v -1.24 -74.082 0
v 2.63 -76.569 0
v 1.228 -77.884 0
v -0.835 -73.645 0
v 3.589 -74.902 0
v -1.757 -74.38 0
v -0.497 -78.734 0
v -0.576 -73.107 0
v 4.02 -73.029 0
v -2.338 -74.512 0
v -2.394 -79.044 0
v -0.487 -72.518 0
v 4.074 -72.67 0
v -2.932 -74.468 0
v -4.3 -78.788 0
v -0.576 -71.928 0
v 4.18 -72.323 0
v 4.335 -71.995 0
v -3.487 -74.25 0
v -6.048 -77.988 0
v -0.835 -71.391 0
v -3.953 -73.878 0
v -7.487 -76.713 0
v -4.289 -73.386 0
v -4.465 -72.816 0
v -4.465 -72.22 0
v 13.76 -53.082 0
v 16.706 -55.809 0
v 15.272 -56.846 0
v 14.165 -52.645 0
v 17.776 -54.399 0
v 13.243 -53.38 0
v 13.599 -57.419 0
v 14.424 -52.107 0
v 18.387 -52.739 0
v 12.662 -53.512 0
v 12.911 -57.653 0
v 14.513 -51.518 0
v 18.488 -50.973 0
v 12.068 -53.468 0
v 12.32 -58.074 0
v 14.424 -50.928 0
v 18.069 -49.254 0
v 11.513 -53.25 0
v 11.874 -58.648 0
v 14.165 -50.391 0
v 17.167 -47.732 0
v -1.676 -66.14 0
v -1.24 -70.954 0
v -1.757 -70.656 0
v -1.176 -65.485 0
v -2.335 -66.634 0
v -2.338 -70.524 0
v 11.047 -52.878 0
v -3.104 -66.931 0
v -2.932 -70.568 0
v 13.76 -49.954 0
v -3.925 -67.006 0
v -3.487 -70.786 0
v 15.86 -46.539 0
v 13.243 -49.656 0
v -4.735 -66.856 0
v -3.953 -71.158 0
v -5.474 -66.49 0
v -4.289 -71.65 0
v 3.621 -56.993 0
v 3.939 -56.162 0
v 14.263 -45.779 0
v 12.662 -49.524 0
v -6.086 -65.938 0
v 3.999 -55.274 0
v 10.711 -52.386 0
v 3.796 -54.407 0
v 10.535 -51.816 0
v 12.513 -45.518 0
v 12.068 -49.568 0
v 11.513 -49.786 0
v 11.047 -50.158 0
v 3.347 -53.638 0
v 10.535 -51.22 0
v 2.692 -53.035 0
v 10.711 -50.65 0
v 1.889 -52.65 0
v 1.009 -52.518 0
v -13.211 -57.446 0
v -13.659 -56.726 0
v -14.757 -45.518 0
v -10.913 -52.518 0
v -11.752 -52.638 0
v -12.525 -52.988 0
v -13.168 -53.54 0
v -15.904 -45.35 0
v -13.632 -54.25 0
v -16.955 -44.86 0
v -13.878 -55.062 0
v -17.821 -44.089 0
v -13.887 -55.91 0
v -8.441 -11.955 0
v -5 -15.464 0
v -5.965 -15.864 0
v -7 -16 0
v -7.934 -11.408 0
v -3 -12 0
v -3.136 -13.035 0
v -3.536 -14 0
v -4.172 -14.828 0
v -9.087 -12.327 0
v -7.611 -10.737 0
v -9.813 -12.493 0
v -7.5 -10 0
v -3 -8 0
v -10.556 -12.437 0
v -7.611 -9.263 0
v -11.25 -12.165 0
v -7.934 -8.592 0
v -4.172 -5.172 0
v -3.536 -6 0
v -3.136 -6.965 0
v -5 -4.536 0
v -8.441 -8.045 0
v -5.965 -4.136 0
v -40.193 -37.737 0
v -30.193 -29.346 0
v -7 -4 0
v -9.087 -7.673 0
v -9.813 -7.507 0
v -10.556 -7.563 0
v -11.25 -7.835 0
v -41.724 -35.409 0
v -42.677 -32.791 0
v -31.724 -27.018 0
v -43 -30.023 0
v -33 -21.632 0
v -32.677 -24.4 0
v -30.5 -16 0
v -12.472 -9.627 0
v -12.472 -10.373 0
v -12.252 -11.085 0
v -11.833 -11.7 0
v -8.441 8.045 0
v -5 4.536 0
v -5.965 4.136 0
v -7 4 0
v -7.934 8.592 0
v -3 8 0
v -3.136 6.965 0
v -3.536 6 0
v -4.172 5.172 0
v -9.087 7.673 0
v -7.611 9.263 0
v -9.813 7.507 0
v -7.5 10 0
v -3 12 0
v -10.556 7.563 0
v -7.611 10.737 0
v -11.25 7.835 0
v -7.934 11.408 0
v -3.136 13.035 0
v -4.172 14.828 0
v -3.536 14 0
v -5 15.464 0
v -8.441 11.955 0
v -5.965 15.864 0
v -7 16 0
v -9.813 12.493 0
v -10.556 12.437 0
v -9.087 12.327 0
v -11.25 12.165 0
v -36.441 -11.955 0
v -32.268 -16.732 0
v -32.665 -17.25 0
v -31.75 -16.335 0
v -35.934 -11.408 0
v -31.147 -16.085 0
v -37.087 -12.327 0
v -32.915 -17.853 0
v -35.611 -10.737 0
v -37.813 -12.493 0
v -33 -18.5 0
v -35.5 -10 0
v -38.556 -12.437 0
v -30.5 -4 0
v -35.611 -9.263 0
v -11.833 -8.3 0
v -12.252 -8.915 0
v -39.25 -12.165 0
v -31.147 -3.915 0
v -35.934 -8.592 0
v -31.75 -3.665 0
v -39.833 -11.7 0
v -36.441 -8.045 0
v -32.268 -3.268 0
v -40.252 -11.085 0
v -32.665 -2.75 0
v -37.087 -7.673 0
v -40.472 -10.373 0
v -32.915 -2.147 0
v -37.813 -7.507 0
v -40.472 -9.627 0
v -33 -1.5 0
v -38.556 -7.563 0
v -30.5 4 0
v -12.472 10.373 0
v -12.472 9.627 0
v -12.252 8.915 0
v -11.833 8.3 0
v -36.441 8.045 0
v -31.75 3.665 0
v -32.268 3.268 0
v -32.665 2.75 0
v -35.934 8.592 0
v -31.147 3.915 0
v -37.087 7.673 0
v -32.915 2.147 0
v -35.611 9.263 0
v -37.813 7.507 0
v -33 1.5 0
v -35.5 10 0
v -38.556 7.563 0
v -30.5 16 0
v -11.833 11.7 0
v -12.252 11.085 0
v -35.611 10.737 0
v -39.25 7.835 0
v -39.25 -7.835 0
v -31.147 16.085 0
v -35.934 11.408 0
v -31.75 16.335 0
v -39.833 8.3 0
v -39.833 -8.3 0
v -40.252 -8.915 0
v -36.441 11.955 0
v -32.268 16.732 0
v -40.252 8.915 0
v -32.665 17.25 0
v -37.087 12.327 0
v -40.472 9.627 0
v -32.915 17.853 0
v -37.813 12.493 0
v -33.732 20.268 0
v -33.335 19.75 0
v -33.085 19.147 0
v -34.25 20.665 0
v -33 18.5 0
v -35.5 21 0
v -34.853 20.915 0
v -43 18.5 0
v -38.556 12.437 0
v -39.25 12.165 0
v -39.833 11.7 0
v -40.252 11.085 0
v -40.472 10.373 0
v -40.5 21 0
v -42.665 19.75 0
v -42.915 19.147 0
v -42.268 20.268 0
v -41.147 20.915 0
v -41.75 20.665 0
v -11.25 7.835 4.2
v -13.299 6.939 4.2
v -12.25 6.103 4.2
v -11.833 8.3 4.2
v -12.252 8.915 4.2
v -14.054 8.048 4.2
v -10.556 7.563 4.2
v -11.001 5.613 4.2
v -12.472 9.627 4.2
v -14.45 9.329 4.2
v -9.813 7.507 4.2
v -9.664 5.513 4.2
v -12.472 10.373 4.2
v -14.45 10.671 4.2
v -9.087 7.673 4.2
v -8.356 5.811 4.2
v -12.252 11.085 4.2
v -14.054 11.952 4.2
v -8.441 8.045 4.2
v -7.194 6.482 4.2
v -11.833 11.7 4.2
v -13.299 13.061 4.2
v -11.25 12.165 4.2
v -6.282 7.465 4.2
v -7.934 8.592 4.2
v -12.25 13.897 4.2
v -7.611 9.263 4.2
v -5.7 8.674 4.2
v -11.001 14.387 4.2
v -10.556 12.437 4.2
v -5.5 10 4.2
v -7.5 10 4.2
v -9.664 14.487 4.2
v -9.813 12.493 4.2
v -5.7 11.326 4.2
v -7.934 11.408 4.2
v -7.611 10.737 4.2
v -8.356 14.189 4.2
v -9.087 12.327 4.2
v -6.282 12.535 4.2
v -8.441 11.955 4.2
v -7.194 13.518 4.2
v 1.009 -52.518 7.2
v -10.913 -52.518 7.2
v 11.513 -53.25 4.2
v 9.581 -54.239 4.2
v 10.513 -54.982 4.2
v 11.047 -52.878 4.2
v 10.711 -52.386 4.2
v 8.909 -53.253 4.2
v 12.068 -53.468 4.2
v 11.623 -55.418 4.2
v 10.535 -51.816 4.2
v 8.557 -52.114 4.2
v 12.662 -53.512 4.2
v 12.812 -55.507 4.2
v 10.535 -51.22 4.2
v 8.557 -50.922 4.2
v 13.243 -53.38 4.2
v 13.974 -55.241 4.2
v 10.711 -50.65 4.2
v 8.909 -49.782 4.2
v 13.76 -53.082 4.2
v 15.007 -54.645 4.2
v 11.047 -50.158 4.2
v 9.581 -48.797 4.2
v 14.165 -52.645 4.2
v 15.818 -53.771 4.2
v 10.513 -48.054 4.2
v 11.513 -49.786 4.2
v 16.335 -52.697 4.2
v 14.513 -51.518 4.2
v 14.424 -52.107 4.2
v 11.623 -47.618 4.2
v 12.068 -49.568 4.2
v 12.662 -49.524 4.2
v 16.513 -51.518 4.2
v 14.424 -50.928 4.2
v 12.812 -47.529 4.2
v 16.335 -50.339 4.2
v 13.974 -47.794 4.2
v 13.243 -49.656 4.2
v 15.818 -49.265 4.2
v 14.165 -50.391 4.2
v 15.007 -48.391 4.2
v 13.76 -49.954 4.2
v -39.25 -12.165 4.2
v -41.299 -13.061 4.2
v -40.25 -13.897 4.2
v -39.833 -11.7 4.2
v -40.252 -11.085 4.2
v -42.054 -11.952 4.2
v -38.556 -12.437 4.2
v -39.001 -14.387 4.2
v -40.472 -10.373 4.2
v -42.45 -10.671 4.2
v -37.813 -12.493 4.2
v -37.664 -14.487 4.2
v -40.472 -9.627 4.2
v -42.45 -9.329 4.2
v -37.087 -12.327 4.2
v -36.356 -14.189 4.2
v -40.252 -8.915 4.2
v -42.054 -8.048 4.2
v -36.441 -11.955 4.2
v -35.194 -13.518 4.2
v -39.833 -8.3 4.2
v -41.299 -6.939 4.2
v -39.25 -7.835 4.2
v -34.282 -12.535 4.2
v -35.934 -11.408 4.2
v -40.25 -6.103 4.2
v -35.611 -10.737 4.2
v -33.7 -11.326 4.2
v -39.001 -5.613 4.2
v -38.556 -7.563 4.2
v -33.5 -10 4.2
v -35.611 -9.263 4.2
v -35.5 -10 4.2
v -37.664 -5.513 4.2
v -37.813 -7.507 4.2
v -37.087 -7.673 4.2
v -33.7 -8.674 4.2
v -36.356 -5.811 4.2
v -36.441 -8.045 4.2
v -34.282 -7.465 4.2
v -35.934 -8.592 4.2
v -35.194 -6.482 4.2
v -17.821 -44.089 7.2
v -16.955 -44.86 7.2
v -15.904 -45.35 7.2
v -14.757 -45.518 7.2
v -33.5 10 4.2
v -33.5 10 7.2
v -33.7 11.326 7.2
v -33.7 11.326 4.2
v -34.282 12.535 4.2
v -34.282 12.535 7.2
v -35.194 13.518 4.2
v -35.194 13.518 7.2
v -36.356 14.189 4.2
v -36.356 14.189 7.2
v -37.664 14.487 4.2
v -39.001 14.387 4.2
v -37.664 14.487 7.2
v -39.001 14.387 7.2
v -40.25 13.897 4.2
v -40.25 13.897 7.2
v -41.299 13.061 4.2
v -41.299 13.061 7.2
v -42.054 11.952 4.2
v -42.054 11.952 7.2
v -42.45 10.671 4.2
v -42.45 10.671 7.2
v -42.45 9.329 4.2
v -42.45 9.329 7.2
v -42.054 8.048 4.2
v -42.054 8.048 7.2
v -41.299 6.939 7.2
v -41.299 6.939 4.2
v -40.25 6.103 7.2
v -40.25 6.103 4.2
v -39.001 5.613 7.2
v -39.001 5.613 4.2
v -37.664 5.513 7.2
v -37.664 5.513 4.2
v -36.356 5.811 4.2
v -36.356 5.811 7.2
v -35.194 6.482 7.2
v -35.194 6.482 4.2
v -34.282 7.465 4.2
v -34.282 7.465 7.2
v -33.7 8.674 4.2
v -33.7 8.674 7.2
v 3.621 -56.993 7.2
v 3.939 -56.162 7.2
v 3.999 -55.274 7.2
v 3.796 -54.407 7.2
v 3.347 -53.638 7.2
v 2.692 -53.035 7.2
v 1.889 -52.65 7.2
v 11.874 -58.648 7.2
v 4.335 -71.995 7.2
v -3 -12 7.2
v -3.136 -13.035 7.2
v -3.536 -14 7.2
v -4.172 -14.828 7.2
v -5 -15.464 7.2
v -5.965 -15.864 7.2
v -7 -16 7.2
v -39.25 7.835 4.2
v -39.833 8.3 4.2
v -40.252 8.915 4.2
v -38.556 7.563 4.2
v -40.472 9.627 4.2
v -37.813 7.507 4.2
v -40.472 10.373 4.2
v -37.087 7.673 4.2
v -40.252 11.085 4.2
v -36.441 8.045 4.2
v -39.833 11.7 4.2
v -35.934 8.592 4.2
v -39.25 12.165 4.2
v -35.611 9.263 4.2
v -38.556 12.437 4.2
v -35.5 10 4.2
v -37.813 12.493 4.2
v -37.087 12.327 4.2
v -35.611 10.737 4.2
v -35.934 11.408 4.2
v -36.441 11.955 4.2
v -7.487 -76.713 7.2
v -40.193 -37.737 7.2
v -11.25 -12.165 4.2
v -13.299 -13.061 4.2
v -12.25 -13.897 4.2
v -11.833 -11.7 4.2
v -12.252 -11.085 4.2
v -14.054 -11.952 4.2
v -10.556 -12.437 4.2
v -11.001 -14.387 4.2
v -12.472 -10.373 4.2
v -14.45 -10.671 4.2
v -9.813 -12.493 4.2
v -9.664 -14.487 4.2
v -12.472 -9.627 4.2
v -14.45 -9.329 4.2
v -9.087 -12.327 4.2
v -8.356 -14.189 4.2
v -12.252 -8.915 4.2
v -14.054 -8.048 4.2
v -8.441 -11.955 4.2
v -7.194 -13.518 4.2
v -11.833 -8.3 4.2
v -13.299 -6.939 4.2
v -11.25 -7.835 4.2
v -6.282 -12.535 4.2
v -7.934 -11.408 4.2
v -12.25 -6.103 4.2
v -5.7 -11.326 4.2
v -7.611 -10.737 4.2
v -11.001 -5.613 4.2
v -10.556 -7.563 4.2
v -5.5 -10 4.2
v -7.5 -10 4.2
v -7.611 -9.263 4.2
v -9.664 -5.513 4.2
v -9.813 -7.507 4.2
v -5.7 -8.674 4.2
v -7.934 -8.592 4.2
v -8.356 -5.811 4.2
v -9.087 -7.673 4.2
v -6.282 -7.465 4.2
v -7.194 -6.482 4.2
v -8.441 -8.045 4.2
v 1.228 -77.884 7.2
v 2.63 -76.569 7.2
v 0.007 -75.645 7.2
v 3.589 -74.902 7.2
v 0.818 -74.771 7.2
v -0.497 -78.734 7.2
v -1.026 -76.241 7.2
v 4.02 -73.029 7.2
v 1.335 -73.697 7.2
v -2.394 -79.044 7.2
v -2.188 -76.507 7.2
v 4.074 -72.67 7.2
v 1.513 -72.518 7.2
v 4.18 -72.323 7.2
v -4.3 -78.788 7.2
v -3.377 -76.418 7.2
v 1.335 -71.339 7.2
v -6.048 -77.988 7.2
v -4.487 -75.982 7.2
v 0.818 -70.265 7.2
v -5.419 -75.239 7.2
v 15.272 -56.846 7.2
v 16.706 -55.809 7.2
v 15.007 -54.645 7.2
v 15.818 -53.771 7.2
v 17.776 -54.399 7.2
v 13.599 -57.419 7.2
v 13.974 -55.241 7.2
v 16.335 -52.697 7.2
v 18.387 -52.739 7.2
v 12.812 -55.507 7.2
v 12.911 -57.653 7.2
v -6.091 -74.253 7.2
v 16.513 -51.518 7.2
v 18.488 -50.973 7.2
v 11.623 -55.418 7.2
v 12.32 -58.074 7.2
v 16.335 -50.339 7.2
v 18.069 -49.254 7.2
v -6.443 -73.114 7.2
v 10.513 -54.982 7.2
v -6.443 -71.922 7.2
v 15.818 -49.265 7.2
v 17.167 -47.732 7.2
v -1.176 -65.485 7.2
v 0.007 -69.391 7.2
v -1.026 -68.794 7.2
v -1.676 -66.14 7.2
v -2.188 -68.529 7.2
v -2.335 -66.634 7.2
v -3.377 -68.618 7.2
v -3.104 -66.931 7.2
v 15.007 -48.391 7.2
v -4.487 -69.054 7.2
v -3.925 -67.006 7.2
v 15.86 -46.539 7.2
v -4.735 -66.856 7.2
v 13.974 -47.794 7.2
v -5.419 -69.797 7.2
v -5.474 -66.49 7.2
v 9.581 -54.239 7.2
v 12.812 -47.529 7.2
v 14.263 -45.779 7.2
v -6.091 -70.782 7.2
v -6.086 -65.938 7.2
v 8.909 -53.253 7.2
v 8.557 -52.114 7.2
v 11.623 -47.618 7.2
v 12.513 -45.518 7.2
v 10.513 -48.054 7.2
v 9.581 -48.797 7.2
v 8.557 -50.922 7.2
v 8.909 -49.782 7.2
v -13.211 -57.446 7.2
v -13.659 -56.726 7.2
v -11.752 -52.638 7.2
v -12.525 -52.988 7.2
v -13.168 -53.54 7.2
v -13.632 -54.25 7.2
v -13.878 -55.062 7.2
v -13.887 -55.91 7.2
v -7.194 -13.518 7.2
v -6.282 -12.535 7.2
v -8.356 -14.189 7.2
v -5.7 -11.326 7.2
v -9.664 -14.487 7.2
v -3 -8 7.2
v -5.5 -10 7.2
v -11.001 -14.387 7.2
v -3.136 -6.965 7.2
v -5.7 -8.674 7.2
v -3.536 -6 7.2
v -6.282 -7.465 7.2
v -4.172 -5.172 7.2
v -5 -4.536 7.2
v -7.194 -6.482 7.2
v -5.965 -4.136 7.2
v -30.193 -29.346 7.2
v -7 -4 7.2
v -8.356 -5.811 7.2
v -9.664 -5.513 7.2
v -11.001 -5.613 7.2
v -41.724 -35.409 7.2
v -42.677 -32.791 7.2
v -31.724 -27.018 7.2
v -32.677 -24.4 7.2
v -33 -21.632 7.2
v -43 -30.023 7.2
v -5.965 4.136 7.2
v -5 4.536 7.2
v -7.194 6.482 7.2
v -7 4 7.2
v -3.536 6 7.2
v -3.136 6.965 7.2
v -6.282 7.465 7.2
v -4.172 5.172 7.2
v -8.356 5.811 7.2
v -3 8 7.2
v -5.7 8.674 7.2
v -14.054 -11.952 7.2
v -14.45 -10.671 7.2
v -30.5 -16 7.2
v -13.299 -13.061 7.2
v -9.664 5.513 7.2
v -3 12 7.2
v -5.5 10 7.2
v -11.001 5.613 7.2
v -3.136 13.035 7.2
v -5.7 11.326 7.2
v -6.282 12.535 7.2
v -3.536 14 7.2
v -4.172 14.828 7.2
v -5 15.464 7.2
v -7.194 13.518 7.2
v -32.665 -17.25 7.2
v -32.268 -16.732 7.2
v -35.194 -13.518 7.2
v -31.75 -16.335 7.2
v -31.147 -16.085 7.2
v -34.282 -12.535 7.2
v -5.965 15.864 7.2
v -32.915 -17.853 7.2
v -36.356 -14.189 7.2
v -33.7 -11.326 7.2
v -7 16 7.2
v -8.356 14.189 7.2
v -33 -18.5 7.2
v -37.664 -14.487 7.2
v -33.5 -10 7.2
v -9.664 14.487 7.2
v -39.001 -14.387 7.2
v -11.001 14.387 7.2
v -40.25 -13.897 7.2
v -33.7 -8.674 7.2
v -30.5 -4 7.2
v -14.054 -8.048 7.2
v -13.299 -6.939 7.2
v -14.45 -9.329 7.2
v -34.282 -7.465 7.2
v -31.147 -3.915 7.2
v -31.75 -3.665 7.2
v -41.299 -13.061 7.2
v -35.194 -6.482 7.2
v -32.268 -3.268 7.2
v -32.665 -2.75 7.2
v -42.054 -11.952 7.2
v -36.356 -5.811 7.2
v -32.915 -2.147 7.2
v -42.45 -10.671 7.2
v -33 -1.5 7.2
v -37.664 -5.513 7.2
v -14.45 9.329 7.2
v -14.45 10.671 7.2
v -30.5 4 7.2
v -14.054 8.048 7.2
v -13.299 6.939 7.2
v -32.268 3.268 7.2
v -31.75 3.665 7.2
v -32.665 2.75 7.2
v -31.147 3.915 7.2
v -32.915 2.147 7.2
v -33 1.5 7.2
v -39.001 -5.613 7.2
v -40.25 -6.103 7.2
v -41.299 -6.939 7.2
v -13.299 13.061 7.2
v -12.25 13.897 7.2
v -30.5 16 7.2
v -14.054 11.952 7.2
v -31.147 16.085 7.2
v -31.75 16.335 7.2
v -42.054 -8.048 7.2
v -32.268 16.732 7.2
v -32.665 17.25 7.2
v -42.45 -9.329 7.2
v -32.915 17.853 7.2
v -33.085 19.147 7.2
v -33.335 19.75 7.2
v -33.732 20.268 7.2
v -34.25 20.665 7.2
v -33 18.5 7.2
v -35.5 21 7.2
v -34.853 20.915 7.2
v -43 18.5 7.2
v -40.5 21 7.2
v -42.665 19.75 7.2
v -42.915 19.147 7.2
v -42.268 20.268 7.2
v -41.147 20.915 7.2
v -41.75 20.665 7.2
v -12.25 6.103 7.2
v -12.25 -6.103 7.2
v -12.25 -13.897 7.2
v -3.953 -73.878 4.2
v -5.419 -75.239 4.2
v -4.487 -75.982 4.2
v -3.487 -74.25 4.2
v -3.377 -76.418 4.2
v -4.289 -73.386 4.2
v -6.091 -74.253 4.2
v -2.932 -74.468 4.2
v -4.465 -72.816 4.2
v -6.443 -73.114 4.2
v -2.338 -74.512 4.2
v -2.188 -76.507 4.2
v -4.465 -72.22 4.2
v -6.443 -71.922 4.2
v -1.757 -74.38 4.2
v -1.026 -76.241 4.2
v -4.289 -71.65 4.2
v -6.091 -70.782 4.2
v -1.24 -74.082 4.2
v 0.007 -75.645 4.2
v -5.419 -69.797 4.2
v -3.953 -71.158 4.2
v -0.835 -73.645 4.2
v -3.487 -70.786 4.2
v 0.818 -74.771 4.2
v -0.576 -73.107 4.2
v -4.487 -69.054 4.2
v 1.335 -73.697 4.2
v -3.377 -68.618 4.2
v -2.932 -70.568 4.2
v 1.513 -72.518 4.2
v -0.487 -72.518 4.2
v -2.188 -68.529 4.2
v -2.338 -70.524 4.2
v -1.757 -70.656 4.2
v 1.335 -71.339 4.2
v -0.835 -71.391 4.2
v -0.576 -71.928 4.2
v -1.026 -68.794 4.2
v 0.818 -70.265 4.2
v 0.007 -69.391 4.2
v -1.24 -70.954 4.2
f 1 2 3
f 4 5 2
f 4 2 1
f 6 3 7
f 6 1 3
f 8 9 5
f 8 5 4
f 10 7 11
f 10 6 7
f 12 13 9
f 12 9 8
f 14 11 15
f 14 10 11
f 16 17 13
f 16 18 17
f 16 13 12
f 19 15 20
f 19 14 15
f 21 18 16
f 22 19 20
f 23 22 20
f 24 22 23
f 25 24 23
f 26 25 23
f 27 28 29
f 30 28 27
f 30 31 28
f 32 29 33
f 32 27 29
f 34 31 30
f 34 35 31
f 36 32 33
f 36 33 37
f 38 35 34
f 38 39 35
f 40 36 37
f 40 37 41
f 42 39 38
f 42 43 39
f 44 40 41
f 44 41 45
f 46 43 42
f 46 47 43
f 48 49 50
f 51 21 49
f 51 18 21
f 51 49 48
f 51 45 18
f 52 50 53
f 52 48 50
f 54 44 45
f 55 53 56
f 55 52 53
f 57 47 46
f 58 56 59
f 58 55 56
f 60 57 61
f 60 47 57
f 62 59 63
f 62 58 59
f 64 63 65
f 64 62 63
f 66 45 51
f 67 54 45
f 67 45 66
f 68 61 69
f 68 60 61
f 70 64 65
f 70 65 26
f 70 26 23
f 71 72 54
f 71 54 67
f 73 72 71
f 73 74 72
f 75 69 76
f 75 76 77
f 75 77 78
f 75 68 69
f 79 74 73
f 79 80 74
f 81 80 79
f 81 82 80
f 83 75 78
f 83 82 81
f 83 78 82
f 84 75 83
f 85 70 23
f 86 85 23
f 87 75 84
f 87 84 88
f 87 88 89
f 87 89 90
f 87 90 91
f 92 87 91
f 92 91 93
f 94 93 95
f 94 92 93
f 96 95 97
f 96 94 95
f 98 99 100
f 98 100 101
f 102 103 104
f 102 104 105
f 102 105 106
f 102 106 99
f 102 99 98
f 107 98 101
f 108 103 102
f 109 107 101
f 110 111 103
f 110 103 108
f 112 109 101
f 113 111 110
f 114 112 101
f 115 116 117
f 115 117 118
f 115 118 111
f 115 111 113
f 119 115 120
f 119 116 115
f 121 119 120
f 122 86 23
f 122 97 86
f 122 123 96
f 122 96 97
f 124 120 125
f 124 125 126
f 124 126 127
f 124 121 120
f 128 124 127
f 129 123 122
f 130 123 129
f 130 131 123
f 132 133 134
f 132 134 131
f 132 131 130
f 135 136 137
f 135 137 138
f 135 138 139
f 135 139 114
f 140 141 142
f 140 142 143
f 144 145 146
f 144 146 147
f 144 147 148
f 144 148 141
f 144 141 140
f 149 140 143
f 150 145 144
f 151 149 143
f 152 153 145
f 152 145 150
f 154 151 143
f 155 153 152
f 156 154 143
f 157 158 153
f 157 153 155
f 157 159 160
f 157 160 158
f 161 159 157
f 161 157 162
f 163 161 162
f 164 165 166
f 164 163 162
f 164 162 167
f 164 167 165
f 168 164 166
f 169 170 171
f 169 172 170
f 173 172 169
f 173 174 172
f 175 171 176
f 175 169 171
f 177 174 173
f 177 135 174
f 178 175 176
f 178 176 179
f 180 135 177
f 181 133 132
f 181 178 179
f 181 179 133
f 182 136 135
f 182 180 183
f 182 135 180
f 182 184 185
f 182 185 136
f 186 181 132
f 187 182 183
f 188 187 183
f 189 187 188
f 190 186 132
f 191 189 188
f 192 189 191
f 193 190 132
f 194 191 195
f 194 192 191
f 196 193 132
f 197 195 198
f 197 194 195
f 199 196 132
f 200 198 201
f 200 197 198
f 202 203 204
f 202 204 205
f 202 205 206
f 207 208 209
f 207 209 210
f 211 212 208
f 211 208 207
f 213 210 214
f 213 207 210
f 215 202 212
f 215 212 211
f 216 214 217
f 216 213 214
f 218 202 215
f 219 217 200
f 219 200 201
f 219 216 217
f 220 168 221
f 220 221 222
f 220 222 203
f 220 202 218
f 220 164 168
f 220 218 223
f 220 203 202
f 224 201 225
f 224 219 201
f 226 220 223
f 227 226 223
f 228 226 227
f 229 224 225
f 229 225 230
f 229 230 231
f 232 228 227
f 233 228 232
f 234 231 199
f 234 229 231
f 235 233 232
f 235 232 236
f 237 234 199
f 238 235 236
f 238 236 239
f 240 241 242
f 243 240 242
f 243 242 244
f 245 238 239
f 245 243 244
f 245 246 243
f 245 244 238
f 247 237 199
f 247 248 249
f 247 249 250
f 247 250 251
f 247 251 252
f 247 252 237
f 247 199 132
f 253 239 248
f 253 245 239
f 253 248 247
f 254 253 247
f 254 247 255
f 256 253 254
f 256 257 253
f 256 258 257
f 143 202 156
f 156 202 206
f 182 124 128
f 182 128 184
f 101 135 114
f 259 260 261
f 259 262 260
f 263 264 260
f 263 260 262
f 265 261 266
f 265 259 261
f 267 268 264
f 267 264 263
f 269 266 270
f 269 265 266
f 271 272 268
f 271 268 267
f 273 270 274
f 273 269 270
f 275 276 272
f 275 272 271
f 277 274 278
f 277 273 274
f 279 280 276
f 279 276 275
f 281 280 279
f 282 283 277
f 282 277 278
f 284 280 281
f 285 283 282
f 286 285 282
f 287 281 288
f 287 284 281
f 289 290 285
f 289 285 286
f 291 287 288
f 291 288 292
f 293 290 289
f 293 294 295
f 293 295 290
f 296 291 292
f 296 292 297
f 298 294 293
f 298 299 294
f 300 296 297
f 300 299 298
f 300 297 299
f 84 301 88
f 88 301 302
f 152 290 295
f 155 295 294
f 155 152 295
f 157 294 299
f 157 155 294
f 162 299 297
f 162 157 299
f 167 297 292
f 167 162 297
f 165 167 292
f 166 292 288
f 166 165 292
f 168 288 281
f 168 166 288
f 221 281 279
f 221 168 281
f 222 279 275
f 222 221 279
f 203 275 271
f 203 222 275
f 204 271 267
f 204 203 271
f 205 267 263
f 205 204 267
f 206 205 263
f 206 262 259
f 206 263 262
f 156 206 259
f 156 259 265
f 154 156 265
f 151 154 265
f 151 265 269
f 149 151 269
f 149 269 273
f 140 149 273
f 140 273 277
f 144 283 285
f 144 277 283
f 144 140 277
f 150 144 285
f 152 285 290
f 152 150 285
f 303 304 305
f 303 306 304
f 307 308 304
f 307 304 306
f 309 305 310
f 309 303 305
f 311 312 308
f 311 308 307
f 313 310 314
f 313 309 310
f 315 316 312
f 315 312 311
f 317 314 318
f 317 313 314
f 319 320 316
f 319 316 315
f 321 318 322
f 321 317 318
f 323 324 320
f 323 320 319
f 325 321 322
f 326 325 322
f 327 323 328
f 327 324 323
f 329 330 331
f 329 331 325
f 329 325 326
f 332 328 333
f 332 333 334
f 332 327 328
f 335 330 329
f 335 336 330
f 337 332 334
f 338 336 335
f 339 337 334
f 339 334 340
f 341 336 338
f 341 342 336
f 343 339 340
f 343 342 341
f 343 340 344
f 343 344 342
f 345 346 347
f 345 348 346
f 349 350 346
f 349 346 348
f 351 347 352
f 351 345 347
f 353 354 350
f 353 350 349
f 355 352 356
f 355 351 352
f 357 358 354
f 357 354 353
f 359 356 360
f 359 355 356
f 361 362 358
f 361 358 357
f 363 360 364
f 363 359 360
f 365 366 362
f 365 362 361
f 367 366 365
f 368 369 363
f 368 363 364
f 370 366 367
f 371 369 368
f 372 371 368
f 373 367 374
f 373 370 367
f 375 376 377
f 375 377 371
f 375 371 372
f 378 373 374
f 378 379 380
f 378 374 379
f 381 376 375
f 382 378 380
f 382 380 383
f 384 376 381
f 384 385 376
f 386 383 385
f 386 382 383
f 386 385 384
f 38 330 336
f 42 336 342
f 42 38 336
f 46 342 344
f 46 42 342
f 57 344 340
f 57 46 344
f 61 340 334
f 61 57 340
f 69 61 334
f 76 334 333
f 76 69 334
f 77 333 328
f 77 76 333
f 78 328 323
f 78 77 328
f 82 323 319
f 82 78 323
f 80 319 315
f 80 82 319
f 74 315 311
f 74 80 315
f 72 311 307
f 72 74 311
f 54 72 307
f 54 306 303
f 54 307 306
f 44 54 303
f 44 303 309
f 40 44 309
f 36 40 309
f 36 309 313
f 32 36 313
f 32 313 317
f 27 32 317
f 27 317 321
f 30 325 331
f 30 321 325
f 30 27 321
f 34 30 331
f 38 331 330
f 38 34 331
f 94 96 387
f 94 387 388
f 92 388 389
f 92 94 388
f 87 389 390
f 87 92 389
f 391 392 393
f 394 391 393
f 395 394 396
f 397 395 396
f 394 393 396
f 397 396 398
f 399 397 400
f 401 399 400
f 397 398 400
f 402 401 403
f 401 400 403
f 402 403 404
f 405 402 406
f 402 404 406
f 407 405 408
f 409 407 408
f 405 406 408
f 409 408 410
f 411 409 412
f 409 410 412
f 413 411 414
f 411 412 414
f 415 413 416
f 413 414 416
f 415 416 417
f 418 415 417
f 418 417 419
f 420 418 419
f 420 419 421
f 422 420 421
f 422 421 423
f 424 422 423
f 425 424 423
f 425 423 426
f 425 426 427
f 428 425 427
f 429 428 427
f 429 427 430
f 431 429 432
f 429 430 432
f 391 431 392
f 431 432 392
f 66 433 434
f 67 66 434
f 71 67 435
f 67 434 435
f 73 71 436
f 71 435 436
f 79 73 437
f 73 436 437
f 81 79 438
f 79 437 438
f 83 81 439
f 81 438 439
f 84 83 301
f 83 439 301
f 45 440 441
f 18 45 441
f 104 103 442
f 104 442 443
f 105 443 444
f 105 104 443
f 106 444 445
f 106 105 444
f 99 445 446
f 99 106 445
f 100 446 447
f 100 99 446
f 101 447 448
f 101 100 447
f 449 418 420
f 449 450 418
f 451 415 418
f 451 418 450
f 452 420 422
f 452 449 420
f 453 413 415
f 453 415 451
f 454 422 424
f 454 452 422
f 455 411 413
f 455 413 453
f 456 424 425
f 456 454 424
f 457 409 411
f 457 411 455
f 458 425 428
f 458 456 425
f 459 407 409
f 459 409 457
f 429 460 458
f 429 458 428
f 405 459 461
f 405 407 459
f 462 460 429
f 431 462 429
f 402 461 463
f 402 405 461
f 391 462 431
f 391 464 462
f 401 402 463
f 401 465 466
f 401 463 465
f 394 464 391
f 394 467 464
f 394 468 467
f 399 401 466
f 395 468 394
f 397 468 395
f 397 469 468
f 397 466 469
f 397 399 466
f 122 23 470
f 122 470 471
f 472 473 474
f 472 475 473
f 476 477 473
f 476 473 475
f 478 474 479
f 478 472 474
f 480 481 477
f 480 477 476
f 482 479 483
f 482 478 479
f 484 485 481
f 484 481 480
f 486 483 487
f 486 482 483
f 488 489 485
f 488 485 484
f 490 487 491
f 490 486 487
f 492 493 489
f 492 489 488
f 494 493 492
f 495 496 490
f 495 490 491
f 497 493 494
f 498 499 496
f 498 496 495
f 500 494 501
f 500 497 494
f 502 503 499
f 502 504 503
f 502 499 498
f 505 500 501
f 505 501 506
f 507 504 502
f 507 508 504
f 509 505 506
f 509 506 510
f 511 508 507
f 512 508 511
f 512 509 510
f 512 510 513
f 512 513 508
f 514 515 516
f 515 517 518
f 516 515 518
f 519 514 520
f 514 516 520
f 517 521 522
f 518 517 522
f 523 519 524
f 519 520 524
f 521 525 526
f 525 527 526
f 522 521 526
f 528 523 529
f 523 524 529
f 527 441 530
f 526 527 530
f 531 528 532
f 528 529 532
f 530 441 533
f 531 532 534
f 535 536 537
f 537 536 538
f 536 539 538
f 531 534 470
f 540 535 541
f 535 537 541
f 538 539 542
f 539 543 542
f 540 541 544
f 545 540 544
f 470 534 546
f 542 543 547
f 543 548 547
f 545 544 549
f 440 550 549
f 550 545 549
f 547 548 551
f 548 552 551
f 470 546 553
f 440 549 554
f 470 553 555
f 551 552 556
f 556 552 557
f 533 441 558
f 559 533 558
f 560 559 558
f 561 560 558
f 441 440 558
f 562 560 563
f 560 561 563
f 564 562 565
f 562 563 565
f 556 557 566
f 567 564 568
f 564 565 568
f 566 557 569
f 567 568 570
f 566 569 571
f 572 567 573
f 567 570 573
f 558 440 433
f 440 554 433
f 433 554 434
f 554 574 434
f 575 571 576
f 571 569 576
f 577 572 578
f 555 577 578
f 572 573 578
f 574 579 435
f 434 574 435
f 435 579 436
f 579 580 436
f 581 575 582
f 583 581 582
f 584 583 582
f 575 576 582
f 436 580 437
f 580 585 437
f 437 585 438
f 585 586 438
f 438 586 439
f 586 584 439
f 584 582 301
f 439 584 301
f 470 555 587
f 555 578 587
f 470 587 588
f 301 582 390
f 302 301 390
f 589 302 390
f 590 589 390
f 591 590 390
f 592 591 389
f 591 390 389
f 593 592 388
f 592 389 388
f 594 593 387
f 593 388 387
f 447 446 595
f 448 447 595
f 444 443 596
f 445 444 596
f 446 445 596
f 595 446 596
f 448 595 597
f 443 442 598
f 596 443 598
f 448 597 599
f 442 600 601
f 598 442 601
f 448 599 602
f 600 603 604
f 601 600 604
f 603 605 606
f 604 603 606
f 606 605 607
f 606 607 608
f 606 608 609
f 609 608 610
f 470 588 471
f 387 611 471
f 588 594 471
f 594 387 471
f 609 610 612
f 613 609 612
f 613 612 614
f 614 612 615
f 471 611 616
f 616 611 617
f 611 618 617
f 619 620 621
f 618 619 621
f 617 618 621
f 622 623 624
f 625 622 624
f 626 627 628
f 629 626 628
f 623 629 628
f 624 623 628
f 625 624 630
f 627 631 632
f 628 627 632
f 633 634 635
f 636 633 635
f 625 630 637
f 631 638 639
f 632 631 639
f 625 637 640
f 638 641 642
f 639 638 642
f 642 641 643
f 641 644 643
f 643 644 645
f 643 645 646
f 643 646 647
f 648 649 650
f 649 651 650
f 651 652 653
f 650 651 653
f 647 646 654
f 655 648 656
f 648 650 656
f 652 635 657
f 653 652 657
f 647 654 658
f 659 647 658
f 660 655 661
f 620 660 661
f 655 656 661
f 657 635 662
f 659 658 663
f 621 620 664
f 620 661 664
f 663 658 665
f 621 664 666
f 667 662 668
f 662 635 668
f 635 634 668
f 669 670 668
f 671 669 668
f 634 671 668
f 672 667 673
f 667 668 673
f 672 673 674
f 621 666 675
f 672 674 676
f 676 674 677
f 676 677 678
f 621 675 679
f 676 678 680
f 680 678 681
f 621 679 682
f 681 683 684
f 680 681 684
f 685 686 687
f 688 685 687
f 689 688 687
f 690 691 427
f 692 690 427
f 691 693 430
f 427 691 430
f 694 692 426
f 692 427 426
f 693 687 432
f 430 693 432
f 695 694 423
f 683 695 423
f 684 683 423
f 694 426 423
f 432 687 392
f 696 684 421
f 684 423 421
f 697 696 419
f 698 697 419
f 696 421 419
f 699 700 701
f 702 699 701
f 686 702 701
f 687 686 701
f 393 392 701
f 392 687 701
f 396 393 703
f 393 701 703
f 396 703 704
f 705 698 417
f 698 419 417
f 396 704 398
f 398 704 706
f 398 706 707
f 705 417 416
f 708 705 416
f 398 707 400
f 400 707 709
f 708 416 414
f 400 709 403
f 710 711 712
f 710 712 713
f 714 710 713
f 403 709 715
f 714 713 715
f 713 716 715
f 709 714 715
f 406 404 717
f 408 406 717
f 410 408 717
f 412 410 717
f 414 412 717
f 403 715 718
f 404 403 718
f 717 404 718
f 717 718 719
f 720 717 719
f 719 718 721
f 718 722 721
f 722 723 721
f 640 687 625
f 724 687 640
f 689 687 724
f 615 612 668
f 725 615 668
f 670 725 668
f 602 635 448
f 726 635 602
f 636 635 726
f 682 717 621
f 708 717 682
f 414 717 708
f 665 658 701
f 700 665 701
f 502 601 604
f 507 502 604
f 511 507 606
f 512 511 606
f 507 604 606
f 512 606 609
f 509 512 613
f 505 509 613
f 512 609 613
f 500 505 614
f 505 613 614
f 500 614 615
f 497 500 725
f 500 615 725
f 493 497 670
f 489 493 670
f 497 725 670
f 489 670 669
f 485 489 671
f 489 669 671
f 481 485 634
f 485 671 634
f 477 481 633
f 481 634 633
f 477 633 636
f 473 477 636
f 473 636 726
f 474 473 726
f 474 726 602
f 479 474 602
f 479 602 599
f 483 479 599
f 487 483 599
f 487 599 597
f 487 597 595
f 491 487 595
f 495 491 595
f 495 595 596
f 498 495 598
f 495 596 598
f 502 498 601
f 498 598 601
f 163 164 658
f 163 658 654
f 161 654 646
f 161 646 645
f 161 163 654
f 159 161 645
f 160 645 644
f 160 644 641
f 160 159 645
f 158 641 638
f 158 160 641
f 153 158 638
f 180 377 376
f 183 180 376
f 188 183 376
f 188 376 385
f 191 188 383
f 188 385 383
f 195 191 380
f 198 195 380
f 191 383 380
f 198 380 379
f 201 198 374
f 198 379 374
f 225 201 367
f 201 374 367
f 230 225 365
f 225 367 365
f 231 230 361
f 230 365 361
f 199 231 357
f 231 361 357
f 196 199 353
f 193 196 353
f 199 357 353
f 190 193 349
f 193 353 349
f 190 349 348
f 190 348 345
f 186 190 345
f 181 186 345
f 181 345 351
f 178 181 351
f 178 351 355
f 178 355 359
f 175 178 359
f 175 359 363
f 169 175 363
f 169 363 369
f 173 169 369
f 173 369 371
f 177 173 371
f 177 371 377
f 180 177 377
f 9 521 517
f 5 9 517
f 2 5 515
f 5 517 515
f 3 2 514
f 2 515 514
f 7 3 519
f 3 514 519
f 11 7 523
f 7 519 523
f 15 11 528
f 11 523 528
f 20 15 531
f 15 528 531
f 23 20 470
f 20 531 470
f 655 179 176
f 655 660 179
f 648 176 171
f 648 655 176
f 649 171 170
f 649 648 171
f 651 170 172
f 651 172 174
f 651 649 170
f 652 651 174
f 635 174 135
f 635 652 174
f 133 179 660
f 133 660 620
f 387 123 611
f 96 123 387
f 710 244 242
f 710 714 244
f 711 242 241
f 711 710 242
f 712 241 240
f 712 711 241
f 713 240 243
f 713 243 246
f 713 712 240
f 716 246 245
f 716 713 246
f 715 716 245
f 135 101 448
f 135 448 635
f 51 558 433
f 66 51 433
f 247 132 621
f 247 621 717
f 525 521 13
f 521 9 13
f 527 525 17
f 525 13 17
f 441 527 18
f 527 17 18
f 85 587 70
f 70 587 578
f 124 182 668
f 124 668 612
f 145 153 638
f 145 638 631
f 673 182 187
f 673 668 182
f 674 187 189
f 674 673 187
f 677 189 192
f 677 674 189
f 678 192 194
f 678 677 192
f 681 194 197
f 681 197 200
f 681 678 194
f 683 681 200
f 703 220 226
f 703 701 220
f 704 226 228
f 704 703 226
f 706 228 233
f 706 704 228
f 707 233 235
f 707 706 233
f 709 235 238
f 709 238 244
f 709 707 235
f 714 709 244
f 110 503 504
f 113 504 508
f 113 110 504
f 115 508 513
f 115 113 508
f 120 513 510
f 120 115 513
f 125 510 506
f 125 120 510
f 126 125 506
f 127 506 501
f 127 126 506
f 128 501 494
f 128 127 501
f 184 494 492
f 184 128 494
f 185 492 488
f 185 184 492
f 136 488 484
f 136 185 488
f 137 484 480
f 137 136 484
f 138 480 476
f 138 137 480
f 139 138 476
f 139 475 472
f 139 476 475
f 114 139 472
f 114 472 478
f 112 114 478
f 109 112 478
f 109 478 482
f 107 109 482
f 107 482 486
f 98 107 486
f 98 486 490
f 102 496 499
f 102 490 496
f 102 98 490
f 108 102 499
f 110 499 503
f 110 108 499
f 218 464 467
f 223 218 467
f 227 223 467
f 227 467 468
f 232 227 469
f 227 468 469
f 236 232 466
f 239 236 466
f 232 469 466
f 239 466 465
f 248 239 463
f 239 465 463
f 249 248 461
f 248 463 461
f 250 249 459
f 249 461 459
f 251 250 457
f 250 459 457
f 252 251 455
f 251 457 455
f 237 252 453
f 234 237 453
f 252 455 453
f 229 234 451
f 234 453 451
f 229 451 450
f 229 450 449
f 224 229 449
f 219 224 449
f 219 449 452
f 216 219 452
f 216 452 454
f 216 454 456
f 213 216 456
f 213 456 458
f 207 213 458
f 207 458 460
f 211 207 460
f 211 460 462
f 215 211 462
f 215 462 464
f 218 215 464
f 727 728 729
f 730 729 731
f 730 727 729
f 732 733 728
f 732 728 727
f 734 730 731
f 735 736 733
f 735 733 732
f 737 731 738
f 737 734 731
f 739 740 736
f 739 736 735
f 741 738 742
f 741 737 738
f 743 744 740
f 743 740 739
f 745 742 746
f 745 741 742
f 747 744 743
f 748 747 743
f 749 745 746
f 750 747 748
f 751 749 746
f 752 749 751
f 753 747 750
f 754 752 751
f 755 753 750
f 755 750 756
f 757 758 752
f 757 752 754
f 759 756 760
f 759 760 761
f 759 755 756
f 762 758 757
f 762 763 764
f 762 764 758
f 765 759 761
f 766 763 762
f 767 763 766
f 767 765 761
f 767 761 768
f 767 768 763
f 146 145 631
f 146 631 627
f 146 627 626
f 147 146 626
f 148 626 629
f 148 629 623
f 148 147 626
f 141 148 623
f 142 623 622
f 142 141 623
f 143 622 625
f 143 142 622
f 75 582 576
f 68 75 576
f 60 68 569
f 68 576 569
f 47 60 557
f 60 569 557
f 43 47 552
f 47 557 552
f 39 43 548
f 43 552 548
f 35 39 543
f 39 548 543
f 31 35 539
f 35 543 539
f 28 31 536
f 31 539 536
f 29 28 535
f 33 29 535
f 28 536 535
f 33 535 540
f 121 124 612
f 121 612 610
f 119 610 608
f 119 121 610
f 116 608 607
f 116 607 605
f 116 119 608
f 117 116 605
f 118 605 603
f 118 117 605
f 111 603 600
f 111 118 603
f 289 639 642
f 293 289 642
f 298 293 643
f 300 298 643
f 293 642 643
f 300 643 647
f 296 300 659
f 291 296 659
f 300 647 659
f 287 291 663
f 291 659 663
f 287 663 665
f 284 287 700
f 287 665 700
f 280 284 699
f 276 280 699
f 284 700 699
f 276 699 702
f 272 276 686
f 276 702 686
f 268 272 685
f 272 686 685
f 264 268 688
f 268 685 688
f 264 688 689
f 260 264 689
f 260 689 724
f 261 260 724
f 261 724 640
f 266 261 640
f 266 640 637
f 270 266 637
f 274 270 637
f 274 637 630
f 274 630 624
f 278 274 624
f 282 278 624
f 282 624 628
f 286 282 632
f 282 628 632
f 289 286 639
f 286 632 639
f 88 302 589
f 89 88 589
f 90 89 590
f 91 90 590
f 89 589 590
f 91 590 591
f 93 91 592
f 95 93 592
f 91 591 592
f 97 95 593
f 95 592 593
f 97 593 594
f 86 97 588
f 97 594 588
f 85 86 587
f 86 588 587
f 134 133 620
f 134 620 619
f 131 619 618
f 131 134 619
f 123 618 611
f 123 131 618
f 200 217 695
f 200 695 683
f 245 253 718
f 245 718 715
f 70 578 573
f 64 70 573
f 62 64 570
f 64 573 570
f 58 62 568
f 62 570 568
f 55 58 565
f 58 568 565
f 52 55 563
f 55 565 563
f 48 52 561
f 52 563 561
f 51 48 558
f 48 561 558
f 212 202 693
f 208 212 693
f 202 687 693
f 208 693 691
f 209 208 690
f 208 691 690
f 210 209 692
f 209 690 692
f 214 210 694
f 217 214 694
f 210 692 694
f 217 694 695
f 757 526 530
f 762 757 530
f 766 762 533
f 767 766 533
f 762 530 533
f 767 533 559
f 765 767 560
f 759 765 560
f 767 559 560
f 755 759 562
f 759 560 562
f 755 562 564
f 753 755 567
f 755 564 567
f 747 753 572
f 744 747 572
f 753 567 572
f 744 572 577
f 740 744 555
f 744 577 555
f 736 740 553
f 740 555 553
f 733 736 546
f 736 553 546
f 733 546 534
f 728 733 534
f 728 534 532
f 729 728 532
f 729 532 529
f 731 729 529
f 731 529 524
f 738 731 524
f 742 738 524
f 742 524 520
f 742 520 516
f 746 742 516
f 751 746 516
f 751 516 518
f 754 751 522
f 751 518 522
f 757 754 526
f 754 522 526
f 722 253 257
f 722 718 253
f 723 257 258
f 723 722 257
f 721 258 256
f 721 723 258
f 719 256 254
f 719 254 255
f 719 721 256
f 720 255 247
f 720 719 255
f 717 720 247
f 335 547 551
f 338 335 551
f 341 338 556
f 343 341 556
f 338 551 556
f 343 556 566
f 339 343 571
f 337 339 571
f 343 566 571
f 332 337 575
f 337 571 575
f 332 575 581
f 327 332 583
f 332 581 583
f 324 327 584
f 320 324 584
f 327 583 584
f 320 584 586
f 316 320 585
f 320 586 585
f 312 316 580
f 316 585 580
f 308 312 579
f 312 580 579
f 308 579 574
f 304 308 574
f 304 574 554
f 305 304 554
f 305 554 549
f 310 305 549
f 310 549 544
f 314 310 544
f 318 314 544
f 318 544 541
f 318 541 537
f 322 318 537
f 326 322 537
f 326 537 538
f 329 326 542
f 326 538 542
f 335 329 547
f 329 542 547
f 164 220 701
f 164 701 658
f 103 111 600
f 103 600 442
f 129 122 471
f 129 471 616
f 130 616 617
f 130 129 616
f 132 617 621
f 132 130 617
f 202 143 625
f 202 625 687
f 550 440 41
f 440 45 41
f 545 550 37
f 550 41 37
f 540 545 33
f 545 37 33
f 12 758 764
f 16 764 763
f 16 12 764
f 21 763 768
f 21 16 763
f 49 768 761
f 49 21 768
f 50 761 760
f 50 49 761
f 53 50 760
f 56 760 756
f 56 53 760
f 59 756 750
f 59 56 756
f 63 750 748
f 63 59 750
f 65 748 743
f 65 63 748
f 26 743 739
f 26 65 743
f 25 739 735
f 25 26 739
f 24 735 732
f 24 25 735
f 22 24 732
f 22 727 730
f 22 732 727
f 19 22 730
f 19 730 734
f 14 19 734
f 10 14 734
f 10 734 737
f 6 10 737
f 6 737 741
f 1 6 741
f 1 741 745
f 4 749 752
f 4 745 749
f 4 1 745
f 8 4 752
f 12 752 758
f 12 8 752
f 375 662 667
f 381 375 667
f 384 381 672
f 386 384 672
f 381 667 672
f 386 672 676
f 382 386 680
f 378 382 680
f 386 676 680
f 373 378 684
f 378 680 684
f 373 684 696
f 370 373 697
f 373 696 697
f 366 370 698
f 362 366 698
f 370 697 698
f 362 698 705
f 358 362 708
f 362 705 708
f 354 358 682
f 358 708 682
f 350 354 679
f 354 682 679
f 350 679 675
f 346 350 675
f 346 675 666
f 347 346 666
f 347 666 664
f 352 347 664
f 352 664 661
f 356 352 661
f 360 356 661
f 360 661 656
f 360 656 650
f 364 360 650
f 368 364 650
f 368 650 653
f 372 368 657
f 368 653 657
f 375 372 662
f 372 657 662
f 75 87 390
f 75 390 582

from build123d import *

# Parameters (mm, degrees)
SKETCH2_R            = 2.5
SKETCH2_R_2          = 2
BOSS_EXTRUDE1_DEPTH  = 7.2
MOVE_FACE1_OUTLINE_R = 2.5
MOVE_FACE1_DEPTH     = 7.2
CUT_EXTRUDE2_DEPTH   = 92.988260121
FILLET1_R            = 2.5
SKETCH5_R            = 2.5
CUT_EXTRUDE3_DEPTH   = 91.271536943
CUT_EXTRUDE4_DEPTH   = 91.271536943
SKETCH8_R            = 4.5
SKETCH8_R_2          = 4
CUT_EXTRUDE5_DEPTH   = 3


# Read off the part's stored shape, not the designer's step: Move Face1
with BuildPart() as part:
    # Sketch2 → Boss-Extrude1 (new body)
    with BuildSketch(Plane.XY):
        with BuildLine():
            Line((3, 4), (-33, 4))
            Line((-33, 4), (-33, -4))
            Line((-33, -4), (3, -4))
            ThreePointArc((3, -4), (5.828427125, -5.171572875), (7, -8))
            Line((7, -8), (7, -12))
            ThreePointArc((7, -12), (5.828427125, -14.828427125), (3, -16))
            Line((3, -16), (-33, -16))
            Line((-33, -16), (-33, -21.632357189))
            ThreePointArc((-33, -21.632357189), (-32.276311449, -25.736598909), (-30.192533317, -29.345808505))
            Line((-30.192533317, -29.345808505), (-17.821439842, -44.089103599))
            ThreePointArc((-17.821439842, -44.089103599), (-16.447735116, -45.143184308), (-14.757262069, -45.51795316))
            Line((-14.757262069, -45.51795316), (14.512756385, -45.51795316))
            ThreePointArc((14.512756385, -45.51795316), (17.34118351, -46.689526036), (18.512756385, -49.51795316))
            Line((18.512756385, -49.51795316), (18.512756385, -81))
            Line((18.512756385, -81), (8.861465874, -81))
            Line((8.861465874, -81), (1.705289702, -81))
            ThreePointArc((1.705289702, -81), (-3.366129439, -79.875693444), (-7.487243615, -76.713451316))
            Line((-7.487243615, -76.713451316), (-40.192533317, -37.736804817))
            ThreePointArc((-40.192533317, -37.736804817), (-42.276311449, -34.12759522), (-43, -30.023353501))
            Line((-43, -30.023353501), (-43, 21))
            Line((-43, 21), (-33, 21))
            Line((-33, 21), (-33, 16))
            Line((-33, 16), (3, 16))
            ThreePointArc((3, 16), (5.828427125, 14.828427125), (7, 12))
            Line((7, 12), (7, 8))
            ThreePointArc((7, 8), (5.828427125, 5.171572875), (3, 4))
        make_face()
        with Locations((0, 10)):
            Circle(SKETCH2_R, mode=Mode.SUBTRACT)
        with Locations(Location((0, -10, 0), (0, 0, 180))):
            Circle(SKETCH2_R, mode=Mode.SUBTRACT)
        with Locations((12.512756385, -51.51795316)):
            Circle(SKETCH2_R_2, mode=Mode.SUBTRACT)
        with Locations((-2.487243615, -72.51795316)):
            Circle(SKETCH2_R_2, mode=Mode.SUBTRACT)
    extrude(amount=BOSS_EXTRUDE1_DEPTH)

    # Move Face1 outline → Move Face1 (cut)
    # profile 1 of 4: a face of its own
    with BuildSketch(Plane.XY):
        with BuildLine():
            Line((-3, -8), (-3, -12))
            ThreePointArc((-3, -12), (-4.171572875, -14.828427125), (-7, -16))
            Line((-7, -16), (3, -16))
            ThreePointArc((3, -16), (5.828427125, -14.828427125), (7, -12))
            Line((7, -12), (7, -8))
            ThreePointArc((7, -8), (5.828427125, -5.171572875), (3, -4))
            Line((3, -4), (-7, -4))
            ThreePointArc((-7, -4), (-4.171572875, -5.171572875), (-3, -8))
        make_face()
        with Locations((0, -10)):
            Circle(MOVE_FACE1_OUTLINE_R, mode=Mode.SUBTRACT)
    # profile 2 of 4: a face of its own
    with BuildSketch(Plane.XY):
        with BuildLine():
            ThreePointArc((-7, 16), (-4.171572875, 14.828427125), (-3, 12))
            Line((-3, 12), (-3, 8))
            ThreePointArc((-3, 8), (-4.171572875, 5.171572875), (-7, 4))
            Line((-7, 4), (3, 4))
            ThreePointArc((3, 4), (5.828427125, 5.171572875), (7, 8))
            Line((7, 8), (7, 12))
            ThreePointArc((7, 12), (5.828427125, 14.828427125), (3, 16))
            Line((3, 16), (-7, 16))
        make_face()
        with Locations((0, 10)):
            Circle(MOVE_FACE1_OUTLINE_R, mode=Mode.SUBTRACT)
    # profile 3 of 4: a face of its own
    with BuildSketch(Plane.XY):
        with Locations((-10, 10)):
            Circle(MOVE_FACE1_OUTLINE_R)
    # profile 4 of 4: a face of its own
    with BuildSketch(Plane.XY):
        with Locations((-10, -10)):
            Circle(MOVE_FACE1_OUTLINE_R)
    extrude(amount=MOVE_FACE1_DEPTH, mode=Mode.SUBTRACT)

    # Sketch4 → Cut-Extrude2 (cut, through all)
    with BuildSketch(Plane.XY.offset(7.2)):
        with BuildLine():
            Line((12.512756385, -57.51795316), (4.039792831, -72.51795316))
            ThreePointArc((4.039792831, -72.51795316), (-0.254865674, -78.651361145), (-7.487243615, -76.713451316))
            Line((-7.487243615, -76.713451316), (-9.608649797, -88.557738574))
            Line((-9.608649797, -88.557738574), (26.411143911, -81.246796091))
            Line((26.411143911, -81.246796091), (26.411143911, -45.51795316))
            Line((26.411143911, -45.51795316), (12.512756385, -45.51795316))
            ThreePointArc((12.512756385, -45.51795316), (18.512756385, -51.51795316), (12.512756385, -57.51795316))
        make_face()
    extrude(amount=-CUT_EXTRUDE2_DEPTH, mode=Mode.SUBTRACT)

    # Fillet1
    fillet1_edges = [part.edges().sort_by_distance(p)[0] for p in [
        (12.512756385, -57.51795316, 3.6),
        (4.039792831, -72.51795316, 3.6),
        (-33, 16, 3.6),
        (-33, 4, 3.6),
        (-33, -4, 3.6),
        (-33, -16, 3.6),
        (-43, 21, 3.6),
        (-33, 21, 3.6),
    ]]
    fillet(fillet1_edges, radius=FILLET1_R - 0.0001)  # a hair under: the kernel refuses the full size

    # Sketch5 → Cut-Extrude3 (cut, through all)
    with BuildSketch(Plane.XY.offset(7.2)):
        with Locations((-38, 10)):
            Circle(SKETCH5_R)
        with Locations((-38, -10)):
            Circle(SKETCH5_R)
    extrude(amount=-CUT_EXTRUDE3_DEPTH, mode=Mode.SUBTRACT)

    # Sketch6 → Cut-Extrude4 (cut, through all)
    with BuildSketch(Plane.XY.offset(7.2)):
        with BuildLine():
            Line((1.008892165, -52.51795316), (-10.912898118, -52.51795316))
            ThreePointArc((-10.912898118, -52.51795316), (-13.631821479, -54.250098375), (-13.211031447, -57.446315989))
            Line((-13.211031447, -57.446315989), (-6.085798343, -65.937838139))
            ThreePointArc((-6.085798343, -65.937838139), (-3.512131749, -66.996795417), (-1.175581436, -65.484947907))
            Line((-1.175581436, -65.484947907), (3.620975743, -56.993425757))
            ThreePointArc((3.620975743, -56.993425757), (3.599878251, -54.005739186), (1.008892165, -52.51795316))
        make_face()
    extrude(amount=-CUT_EXTRUDE4_DEPTH, mode=Mode.SUBTRACT)

    # Sketch8 → Cut-Extrude5 (cut)
    with BuildSketch(Plane.XY.offset(7.2)):
        with Locations((-38, 10)):
            Circle(SKETCH8_R)
        with Locations((-10, 10)):
            Circle(SKETCH8_R)
        with Locations((-38, -10)):
            Circle(SKETCH8_R)
        with Locations((-10, -10)):
            Circle(SKETCH8_R)
        with Locations((12.512756385, -51.51795316)):
            Circle(SKETCH8_R_2)
        with Locations((-2.487243615, -72.51795316)):
            Circle(SKETCH8_R_2)
    extrude(amount=-CUT_EXTRUDE5_DEPTH, mode=Mode.SUBTRACT)


solid = part.part
